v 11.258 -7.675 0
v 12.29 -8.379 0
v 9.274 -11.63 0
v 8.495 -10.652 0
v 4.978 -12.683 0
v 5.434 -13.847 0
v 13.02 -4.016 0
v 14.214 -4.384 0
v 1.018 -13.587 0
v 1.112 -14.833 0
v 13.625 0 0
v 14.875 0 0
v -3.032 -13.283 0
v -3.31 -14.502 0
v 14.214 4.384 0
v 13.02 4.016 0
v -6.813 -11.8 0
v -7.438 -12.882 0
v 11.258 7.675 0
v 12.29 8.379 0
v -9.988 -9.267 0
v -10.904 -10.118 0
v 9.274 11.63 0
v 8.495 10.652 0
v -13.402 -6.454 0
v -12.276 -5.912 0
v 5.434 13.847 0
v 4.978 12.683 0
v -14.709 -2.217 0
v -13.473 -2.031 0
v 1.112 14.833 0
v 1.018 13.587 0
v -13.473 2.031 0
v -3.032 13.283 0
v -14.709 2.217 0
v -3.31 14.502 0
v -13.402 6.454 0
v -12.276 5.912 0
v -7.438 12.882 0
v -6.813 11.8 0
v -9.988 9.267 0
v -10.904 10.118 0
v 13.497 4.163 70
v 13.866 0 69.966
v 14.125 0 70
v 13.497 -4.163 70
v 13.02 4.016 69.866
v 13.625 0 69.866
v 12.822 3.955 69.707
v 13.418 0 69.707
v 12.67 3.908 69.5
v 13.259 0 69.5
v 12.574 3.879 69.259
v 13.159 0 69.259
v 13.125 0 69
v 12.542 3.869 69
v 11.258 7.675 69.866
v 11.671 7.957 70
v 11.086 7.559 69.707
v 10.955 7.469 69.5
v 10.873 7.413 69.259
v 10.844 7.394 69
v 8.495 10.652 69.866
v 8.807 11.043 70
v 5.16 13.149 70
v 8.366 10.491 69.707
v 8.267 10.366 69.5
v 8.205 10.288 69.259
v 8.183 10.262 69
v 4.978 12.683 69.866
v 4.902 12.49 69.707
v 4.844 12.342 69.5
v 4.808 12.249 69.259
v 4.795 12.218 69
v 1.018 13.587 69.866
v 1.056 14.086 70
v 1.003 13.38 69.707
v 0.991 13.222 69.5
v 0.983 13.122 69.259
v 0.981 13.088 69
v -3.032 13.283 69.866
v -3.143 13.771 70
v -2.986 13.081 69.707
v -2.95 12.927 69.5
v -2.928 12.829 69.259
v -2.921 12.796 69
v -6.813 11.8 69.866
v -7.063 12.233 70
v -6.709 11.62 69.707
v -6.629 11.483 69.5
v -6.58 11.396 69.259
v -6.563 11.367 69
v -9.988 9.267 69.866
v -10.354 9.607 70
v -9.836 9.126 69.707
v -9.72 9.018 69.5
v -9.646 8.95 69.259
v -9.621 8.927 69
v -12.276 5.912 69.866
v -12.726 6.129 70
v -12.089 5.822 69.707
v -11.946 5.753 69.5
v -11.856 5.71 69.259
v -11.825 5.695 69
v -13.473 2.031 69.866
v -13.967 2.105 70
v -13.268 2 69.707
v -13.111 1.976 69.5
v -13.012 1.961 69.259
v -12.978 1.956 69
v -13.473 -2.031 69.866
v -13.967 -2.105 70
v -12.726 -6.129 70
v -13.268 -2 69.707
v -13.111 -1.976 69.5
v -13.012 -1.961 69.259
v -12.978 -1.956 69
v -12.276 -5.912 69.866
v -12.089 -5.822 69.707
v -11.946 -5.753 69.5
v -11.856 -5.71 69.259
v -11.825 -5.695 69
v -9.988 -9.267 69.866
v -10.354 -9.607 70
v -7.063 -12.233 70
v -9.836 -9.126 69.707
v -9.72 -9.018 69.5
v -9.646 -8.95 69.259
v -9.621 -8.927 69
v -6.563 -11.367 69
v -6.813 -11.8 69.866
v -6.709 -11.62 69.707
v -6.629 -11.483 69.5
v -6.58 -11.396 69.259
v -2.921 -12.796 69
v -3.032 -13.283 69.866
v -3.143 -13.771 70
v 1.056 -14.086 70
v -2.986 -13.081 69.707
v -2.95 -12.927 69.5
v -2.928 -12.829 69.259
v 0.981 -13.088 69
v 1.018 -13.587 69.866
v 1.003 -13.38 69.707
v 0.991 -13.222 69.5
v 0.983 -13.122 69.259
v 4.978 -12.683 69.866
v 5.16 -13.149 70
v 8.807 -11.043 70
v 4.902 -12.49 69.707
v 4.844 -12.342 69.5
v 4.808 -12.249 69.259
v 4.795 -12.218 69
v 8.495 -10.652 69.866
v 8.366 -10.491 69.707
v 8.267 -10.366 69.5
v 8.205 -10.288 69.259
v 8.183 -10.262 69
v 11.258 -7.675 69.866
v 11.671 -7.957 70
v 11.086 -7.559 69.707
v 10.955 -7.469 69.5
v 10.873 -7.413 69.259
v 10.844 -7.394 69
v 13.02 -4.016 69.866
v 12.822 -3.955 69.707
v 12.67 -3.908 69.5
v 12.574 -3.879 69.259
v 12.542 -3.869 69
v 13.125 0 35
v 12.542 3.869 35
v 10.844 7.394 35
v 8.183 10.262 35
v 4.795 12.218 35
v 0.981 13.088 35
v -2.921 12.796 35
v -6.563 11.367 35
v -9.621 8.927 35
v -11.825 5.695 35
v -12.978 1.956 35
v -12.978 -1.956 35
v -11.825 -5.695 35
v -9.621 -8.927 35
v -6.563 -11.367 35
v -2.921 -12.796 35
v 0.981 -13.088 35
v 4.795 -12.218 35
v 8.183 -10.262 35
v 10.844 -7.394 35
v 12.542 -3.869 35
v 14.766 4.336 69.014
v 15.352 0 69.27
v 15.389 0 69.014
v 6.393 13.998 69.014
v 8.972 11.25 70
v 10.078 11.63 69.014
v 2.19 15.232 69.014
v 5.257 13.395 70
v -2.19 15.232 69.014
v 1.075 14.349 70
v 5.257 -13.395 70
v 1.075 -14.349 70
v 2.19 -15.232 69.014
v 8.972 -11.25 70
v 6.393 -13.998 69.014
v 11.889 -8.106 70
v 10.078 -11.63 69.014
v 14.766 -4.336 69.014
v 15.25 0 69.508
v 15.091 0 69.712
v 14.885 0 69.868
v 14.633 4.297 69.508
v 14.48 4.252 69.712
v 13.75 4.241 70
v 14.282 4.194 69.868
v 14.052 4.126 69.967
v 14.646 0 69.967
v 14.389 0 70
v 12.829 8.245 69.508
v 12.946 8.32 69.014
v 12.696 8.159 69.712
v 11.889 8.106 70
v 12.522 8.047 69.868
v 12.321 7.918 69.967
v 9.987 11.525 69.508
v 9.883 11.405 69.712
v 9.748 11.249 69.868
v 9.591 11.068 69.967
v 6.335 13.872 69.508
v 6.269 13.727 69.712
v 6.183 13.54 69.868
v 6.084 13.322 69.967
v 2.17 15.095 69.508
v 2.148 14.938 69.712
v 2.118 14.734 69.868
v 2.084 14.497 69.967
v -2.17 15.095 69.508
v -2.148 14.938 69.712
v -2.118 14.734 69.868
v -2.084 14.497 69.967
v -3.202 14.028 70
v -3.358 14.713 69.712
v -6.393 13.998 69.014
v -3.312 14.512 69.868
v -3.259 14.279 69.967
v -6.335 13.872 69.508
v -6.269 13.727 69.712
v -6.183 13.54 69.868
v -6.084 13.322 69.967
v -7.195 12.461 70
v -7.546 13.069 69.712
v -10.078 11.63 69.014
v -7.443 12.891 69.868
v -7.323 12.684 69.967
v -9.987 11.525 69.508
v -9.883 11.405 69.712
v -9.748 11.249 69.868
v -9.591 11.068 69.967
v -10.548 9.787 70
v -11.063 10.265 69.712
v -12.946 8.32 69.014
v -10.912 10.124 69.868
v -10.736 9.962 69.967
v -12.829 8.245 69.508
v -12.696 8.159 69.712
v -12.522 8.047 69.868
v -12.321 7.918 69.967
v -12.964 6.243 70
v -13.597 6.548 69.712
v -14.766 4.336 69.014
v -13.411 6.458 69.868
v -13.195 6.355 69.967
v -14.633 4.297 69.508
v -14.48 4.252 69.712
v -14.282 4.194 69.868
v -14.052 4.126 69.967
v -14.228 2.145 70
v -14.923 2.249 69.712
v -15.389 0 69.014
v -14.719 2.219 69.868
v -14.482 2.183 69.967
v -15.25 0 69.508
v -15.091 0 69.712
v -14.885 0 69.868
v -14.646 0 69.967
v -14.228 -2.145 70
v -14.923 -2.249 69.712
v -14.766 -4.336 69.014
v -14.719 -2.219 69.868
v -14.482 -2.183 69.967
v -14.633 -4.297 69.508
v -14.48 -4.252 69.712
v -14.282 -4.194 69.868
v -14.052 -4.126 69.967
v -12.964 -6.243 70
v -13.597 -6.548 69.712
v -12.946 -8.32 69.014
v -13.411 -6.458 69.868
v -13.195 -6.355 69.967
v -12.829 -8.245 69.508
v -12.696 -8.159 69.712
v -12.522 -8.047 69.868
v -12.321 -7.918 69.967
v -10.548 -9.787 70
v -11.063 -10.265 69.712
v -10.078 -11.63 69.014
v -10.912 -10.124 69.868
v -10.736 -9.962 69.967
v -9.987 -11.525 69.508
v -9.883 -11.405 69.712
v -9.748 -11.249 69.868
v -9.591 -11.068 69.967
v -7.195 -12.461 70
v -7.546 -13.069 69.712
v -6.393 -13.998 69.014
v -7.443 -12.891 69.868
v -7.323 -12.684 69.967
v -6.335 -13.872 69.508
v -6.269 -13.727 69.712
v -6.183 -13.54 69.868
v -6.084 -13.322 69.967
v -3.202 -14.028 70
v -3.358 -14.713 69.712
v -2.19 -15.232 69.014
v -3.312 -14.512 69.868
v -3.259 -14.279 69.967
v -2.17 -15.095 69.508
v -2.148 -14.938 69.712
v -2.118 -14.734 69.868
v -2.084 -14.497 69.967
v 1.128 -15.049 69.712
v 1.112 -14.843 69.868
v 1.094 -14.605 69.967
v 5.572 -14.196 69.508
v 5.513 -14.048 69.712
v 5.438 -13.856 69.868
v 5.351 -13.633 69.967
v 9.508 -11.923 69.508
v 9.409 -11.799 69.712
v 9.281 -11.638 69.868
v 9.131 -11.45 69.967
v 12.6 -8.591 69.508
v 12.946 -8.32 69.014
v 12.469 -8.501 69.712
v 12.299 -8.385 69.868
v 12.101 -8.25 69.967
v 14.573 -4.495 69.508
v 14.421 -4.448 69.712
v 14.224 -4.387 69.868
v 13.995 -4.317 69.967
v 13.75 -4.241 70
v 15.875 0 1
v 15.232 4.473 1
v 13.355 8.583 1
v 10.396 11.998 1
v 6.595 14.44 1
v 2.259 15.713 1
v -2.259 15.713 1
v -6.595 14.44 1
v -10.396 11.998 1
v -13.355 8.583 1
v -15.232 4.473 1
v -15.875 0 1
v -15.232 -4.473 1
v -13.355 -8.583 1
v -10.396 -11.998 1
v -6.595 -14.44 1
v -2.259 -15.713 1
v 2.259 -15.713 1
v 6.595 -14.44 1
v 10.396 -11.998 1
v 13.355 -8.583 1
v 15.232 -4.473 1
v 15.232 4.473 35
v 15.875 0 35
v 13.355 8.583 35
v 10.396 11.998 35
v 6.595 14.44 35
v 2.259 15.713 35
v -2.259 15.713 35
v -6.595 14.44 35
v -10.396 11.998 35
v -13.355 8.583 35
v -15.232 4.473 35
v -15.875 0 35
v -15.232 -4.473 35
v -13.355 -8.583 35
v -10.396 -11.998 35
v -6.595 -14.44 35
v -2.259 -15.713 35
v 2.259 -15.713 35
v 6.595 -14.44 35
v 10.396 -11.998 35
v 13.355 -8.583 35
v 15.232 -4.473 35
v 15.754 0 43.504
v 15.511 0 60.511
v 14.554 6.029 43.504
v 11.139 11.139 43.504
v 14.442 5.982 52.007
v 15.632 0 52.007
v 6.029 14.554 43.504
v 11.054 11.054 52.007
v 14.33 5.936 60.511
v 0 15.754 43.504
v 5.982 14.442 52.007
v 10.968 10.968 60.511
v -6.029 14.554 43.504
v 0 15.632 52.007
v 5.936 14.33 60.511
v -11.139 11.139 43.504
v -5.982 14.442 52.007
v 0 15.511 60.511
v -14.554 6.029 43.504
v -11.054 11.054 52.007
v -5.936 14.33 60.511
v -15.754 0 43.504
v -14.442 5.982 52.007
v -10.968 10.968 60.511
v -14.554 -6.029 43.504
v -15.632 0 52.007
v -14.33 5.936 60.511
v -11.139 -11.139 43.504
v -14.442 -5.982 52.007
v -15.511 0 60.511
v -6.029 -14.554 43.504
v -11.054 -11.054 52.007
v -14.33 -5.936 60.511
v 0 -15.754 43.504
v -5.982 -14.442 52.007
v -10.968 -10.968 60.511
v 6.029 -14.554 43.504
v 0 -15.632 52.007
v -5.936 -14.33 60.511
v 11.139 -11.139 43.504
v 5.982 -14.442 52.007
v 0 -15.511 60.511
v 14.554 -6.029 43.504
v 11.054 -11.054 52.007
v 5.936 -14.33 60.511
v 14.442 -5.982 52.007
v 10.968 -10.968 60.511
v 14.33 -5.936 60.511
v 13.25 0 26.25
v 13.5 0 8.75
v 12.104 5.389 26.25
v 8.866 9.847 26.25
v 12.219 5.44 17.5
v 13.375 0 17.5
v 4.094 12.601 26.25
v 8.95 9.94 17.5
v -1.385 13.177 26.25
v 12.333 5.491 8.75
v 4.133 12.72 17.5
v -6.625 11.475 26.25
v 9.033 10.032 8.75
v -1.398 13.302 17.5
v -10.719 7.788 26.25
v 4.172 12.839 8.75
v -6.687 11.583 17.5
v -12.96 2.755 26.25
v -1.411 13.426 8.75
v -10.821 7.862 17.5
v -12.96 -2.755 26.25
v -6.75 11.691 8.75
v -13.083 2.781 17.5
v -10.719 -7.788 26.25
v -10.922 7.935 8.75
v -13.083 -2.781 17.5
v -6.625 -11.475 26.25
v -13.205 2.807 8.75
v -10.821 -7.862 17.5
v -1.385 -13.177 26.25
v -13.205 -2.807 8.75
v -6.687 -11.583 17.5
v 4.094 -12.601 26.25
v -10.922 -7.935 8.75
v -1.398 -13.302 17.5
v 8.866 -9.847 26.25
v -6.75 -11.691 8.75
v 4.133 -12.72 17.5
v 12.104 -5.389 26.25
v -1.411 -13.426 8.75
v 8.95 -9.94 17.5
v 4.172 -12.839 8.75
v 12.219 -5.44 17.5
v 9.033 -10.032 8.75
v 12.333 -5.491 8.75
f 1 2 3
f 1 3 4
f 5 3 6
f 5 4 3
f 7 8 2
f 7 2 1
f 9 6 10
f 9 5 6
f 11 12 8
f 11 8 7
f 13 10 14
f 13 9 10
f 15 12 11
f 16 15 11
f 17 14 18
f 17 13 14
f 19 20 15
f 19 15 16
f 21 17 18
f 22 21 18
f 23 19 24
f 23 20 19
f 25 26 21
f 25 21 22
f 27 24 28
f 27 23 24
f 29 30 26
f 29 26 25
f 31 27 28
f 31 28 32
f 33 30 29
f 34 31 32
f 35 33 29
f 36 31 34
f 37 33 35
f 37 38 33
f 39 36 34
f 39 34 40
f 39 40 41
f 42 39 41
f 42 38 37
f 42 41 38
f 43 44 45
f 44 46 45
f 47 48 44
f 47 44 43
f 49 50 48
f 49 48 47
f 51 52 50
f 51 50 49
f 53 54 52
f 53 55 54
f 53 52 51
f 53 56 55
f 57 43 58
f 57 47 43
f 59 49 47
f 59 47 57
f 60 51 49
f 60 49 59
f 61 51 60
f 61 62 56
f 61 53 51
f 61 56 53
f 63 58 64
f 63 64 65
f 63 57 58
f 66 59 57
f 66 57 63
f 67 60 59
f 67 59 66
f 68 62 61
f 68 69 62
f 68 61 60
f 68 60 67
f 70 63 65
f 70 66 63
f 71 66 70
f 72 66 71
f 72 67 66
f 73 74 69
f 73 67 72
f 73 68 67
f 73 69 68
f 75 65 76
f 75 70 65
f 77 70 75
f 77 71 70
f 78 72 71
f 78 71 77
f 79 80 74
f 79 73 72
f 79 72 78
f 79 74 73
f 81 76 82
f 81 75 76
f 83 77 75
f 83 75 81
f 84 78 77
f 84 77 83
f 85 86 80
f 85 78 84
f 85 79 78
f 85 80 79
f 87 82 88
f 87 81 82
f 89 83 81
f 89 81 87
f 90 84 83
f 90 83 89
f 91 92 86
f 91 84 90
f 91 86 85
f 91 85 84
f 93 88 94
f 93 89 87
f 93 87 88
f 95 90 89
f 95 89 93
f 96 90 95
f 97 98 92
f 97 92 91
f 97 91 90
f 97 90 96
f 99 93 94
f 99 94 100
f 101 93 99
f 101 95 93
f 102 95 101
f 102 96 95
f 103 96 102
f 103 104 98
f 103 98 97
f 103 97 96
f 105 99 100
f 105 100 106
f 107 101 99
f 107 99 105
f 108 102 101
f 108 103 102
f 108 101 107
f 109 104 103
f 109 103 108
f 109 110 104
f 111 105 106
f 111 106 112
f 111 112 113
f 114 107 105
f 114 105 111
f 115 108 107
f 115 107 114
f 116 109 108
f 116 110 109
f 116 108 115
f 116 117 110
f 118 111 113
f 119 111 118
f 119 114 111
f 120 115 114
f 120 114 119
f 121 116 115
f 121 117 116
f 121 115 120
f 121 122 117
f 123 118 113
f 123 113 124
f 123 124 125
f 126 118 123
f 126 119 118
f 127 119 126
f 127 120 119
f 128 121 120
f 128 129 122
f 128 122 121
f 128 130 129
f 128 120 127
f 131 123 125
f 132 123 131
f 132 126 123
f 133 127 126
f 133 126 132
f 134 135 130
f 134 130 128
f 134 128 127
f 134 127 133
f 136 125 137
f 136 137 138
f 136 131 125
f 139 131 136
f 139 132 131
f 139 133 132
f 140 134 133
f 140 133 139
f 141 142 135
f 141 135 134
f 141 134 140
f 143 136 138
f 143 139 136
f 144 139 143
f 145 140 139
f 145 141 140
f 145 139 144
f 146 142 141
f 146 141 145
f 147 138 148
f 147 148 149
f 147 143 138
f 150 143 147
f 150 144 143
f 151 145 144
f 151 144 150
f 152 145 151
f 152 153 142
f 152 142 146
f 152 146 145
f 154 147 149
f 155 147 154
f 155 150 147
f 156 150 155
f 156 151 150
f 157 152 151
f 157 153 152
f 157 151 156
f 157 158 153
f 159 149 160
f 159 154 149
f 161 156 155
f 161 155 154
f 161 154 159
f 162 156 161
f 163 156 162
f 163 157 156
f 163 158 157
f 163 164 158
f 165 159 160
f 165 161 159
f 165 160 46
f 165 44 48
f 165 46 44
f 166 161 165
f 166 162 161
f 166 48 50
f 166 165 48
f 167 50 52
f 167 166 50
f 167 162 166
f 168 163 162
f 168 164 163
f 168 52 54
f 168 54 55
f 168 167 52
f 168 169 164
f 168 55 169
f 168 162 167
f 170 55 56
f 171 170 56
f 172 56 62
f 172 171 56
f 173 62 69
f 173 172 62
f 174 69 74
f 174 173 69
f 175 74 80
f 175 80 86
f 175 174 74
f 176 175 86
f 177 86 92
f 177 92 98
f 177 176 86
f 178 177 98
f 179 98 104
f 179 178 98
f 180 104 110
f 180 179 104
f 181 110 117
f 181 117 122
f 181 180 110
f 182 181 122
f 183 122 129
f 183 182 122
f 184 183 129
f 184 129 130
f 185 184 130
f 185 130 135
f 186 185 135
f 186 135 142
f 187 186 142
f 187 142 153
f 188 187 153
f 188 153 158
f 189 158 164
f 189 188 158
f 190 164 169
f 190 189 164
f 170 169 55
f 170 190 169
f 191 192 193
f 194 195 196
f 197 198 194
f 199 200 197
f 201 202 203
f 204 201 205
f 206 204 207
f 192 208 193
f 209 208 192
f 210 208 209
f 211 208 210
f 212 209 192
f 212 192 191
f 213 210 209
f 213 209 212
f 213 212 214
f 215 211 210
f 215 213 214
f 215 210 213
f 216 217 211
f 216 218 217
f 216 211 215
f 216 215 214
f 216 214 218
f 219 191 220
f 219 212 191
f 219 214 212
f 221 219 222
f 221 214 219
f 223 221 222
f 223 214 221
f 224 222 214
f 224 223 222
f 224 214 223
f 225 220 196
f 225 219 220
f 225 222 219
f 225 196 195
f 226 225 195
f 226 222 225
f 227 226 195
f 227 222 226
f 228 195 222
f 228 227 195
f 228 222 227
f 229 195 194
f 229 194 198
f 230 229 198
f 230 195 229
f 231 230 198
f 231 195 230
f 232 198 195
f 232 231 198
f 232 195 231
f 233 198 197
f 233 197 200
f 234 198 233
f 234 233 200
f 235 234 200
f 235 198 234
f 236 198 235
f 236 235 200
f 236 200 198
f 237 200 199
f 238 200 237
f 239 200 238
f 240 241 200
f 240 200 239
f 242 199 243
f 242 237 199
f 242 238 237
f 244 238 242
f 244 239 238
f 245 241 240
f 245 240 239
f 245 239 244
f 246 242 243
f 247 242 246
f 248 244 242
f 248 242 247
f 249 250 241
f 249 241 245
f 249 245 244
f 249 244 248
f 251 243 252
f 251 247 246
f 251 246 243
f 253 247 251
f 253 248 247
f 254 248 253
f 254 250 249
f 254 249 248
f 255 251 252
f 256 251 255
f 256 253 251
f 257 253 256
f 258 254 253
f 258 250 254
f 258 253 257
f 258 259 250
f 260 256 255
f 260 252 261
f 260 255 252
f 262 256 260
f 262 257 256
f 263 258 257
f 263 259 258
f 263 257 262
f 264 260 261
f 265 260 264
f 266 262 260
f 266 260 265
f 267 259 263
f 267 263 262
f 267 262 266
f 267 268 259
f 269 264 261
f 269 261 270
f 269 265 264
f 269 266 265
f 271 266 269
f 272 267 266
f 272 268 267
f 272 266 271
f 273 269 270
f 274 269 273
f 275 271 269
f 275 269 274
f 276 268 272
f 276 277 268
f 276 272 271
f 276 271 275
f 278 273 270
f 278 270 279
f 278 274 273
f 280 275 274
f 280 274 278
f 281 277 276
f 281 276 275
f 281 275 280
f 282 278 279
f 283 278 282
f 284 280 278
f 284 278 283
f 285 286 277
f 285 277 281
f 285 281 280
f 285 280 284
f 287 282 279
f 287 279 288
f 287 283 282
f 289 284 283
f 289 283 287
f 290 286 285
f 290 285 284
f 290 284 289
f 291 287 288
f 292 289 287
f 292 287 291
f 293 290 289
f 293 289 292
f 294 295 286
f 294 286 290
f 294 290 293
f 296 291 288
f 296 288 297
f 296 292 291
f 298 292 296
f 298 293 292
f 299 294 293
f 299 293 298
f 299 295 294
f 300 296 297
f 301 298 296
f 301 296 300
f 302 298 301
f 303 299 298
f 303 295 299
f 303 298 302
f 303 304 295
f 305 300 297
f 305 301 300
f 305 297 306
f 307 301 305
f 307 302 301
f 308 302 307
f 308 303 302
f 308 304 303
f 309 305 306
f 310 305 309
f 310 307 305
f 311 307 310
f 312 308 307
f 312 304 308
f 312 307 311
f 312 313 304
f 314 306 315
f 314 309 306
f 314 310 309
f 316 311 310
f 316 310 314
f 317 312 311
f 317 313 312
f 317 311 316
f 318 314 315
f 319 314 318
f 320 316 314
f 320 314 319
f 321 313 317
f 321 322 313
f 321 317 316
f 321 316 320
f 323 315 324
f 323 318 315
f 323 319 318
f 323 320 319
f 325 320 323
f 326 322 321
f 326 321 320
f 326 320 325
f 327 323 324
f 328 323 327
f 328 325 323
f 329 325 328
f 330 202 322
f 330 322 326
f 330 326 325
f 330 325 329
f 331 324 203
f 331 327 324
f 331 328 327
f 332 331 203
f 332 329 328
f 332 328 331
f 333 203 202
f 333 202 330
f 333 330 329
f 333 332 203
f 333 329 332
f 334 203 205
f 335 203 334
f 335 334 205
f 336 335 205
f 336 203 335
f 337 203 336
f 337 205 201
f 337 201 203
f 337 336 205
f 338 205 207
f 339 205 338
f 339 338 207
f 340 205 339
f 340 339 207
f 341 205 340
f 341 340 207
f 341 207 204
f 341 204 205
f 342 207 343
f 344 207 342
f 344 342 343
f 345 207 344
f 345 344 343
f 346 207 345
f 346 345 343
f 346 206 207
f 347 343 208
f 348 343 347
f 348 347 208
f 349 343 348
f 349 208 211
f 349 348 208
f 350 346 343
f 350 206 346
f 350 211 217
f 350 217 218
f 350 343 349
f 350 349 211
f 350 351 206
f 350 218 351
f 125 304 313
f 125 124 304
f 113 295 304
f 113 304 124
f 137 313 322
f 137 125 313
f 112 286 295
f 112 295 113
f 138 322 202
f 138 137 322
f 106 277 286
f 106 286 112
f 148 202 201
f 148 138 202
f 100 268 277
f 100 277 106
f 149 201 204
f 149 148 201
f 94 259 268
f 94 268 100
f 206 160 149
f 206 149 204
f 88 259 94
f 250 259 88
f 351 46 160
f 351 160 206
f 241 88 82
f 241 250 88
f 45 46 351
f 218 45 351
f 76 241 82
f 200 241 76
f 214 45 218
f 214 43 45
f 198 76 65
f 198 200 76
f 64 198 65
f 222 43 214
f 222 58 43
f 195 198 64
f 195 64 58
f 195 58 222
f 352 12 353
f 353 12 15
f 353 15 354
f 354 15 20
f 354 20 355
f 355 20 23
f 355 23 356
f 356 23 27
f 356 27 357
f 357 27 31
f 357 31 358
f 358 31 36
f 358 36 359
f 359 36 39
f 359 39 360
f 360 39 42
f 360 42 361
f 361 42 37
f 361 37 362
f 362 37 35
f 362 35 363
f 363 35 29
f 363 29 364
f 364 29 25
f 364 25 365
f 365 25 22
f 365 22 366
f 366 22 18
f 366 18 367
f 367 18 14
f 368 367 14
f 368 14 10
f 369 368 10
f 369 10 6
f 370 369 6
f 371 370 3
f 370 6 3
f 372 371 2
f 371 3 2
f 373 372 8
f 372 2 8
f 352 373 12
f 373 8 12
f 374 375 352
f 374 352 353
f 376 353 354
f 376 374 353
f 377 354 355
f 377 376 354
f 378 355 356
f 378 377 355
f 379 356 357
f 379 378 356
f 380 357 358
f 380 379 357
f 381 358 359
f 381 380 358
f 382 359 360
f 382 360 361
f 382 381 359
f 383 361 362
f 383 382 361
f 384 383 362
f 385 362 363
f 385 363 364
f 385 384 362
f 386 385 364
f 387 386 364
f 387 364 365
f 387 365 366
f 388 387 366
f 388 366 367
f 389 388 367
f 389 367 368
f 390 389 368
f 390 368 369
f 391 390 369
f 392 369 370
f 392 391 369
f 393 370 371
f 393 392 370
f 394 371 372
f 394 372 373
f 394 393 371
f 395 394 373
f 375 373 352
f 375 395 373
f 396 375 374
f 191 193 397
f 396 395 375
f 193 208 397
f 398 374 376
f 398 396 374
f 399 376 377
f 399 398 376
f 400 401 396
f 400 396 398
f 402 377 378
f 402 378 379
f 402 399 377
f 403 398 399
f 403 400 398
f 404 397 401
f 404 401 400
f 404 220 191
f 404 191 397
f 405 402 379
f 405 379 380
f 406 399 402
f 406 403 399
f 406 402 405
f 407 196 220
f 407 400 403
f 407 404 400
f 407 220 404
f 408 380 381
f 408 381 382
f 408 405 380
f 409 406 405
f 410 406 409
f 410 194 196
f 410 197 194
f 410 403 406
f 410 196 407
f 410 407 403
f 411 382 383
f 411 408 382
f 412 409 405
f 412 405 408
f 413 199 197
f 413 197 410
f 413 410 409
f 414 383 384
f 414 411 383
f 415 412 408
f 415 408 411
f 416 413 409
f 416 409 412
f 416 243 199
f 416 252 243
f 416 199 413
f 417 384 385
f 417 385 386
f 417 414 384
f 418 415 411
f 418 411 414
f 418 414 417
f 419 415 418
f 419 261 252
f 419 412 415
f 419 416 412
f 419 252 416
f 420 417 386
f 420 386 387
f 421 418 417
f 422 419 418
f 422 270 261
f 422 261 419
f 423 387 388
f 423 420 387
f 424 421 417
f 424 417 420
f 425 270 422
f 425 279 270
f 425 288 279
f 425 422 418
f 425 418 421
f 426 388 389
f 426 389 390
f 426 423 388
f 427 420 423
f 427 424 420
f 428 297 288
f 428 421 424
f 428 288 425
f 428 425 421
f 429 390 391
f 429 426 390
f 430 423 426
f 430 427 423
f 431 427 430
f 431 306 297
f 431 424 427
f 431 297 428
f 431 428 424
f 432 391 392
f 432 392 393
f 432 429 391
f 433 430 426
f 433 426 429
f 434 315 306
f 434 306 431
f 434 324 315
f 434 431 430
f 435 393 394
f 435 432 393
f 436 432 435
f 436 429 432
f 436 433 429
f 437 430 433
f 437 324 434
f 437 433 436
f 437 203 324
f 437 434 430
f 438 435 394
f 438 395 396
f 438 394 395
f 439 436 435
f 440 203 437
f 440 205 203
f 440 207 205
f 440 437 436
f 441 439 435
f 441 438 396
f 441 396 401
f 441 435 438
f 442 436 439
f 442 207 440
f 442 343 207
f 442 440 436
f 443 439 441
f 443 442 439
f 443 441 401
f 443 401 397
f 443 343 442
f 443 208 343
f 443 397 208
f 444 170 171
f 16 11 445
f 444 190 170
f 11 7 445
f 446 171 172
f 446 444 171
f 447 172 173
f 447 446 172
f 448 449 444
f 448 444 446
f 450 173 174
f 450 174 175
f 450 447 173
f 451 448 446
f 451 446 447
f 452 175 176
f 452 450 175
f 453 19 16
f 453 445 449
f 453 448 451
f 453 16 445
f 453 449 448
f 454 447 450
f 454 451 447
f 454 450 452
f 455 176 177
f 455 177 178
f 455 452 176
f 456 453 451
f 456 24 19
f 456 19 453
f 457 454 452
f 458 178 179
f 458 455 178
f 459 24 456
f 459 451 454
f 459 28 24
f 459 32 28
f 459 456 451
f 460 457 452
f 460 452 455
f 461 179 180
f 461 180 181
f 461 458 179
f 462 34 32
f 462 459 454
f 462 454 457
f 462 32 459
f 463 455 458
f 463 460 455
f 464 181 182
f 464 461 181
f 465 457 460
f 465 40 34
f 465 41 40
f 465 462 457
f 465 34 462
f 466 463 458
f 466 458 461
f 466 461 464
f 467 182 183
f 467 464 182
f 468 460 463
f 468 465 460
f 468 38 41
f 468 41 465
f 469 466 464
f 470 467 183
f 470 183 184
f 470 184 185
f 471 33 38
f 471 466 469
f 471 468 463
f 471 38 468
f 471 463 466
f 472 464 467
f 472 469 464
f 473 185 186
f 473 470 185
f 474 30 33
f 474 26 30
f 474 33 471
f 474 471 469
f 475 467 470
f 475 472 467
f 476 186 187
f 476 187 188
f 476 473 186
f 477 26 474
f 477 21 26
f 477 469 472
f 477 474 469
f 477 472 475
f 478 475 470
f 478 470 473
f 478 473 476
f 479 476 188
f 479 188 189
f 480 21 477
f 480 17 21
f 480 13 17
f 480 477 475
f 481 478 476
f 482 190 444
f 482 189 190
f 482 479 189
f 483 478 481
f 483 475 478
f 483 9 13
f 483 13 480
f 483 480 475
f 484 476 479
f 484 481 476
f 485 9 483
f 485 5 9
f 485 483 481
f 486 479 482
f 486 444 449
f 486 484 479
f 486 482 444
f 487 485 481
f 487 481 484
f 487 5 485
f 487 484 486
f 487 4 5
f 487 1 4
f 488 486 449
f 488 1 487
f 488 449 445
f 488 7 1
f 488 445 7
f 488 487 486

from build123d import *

# Parameters (mm, degrees)
F2_R    = 1
F3_SIZE = 1


with BuildPart() as f1:
    # F0 (on Front) → F1 (revolve)
    with BuildSketch(Plane.XZ):
        Polygon((15.875, 0), (15.875, 35), (15.375, 70), (13.125, 70), (13.125, 35), (13.625, 0), align=None)
    revolve(axis=Axis((0, 0, 29.460958), (0, 0, 1)))

    # F2
    f2_edges = [f1.edges().sort_by_distance(p)[0] for p in [
        (-15.375, 0, 70),
        (-13.125, 0, 70),
    ]]
    fillet(f2_edges, radius=F2_R)

    # F3
    f3_edges = [f1.edges().sort_by_distance(p)[0] for p in [
        (-15.875, 0, 0),
    ]]
    chamfer(f3_edges, length=F3_SIZE)


solid = f1.part
